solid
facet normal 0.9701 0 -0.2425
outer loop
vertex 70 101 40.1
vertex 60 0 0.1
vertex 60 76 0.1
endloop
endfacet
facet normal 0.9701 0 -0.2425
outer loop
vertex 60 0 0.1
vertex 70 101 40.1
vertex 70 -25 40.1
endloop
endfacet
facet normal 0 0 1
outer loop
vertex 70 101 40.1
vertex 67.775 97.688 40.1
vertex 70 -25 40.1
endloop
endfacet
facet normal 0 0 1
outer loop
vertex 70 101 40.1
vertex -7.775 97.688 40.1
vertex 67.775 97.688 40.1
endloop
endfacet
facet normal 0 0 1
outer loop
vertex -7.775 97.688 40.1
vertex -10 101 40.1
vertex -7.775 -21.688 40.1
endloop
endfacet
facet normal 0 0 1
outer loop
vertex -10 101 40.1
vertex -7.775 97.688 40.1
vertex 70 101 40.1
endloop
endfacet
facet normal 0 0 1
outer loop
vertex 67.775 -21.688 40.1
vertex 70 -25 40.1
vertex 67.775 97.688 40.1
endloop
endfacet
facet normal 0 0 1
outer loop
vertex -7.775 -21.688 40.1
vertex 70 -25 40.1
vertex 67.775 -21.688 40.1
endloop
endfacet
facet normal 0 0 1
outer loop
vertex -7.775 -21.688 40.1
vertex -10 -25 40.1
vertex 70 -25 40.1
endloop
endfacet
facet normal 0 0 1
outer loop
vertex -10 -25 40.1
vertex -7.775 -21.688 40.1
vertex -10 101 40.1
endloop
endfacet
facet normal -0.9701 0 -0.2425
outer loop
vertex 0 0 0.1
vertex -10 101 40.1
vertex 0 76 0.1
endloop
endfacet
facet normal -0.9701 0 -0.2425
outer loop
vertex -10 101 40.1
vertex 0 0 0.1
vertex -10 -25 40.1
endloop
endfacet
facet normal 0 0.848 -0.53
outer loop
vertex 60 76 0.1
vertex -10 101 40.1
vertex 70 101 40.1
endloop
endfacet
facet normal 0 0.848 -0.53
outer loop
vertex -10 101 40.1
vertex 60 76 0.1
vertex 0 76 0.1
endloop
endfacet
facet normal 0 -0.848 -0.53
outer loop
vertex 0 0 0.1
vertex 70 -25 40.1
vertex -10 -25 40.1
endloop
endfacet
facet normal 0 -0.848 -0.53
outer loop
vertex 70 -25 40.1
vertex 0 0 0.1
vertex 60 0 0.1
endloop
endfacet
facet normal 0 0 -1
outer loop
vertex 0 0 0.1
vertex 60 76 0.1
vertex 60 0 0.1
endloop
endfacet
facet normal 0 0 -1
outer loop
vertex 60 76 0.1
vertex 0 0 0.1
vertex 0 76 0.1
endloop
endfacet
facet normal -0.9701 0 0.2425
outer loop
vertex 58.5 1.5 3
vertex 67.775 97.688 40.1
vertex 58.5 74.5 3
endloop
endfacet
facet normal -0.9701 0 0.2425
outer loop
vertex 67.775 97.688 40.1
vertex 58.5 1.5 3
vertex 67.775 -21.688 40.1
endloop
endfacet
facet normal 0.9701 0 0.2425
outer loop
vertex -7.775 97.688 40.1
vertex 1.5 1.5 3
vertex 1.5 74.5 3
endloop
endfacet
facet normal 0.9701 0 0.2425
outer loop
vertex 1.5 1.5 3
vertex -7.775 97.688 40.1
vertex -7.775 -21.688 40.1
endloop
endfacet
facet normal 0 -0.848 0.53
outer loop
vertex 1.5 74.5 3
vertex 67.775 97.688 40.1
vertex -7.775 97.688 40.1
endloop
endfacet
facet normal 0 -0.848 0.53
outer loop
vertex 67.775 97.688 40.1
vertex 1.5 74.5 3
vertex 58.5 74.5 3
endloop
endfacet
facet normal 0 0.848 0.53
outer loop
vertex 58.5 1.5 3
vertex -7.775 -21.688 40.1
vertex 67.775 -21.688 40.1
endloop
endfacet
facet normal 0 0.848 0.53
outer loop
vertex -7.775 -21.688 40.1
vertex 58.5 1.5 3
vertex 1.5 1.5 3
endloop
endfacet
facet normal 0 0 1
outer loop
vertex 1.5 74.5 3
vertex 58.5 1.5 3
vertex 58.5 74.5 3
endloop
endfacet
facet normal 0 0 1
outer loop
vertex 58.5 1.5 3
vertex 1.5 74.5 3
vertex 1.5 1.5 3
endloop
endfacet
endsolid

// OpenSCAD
// preview[view:south, tilt:top]

/* [Global] */
// in mm
tray_width = 76;
// in mm
tray_height = 60;
// in mm
wall_thickness = 1.5;
// in mm
floor_thickness = 3;
// in mm
tray_depth = 40;

//How much higher is the height at the top? in mm. 
offset_height = 20;
//How much wider is the width at the top? in mm
offset_width = 50;

/* [Hidden] */
// ignore variable values
//layer1
topLeft = [0, 0, 0];//0//[hidden]
topMiddle = [0, tray_width / 2, 0];//1//[hidden]
topRight = [0, tray_width, 0];//2//[hidden]
middleRight = [tray_height / 2,tray_width, 0];//3//[hidden]
bottomRight = [tray_height, tray_width,0];//4//[hidden]
bottomMiddle = [tray_height, tray_width / 2, 0];//5//[hidden]
bottomLeft = [tray_height, 0, 0];//6//[hidden]
middleLeft = [tray_height / 2, 0, 0];//7//[hidden]


//layer2//[hidden]
l2TopLeft = [0 - offset_height / 2, 0 - offset_width / 2, tray_depth];//8//[hidden]
l2TopRight = [0 - offset_height / 2, tray_width + offset_width / 2, tray_depth];//9//[hidden]
l2BottomRight = [tray_height + offset_height / 2, tray_width + offset_width / 2,tray_depth];//10//[hidden]
l2BottomLeft = [tray_height + offset_height / 2, 0 - offset_width / 2, tray_depth];//11//[hidden]

//top

tl = 0;//[hidden]
tr = 1;//[hidden]
br = 2;//[hidden]
bl = 3;//[hidden]
l2tl = 4;//[hidden]
l2tr = 5;//[hidden]
l2br = 6;//[hidden]
l2bl = 7;//[hidden]
offset = 1.5;


module tray(offset, bottomOffset){ 
  
  
      
  polyhedron(
  //
  //
  
  points=[
    [topLeft[0] + offset,       topLeft[1] + offset,        topLeft[2] + bottomOffset],
    [topRight[0] + offset,      topRight[1] - offset,       topRight[2] + bottomOffset], 
    [bottomRight[0] - offset,   bottomRight[1]  - offset,   bottomRight[2] + bottomOffset],
    [bottomLeft[0] - offset,     bottomLeft[1] + offset,     bottomLeft[2] + bottomOffset],
    [l2TopLeft[0] + offset,     l2TopLeft[1] + offset,      l2TopLeft[2] + bottomOffset],
    [l2TopRight[0] + offset,    l2TopRight[1] - offset,     l2TopRight[2] + bottomOffset],
    [l2BottomRight[0] - offset, l2BottomRight[1] - offset,  l2BottomRight[2] + bottomOffset],
    [l2BottomLeft[0] - offset,  l2BottomLeft[1] + offset,   l2BottomLeft[2] + bottomOffset]],
     
  triangles = [
    [tl,bl,tr], [br,tr,bl],   //base
    [tl,tr, l2tr, l2tl], //top wall
    [l2br, l2tr, tr, br],//right wall
    [l2br, br, bl, l2bl],//bottom wall
    [l2tl, l2bl, bl, tl],//left wall
    [l2tr, l2br, l2tl], [l2br, l2bl, l2tl]//top
 ]);
}
difference(){

  tray(0,0.1);
  tray(wall_thickness, floor_thickness);
};
